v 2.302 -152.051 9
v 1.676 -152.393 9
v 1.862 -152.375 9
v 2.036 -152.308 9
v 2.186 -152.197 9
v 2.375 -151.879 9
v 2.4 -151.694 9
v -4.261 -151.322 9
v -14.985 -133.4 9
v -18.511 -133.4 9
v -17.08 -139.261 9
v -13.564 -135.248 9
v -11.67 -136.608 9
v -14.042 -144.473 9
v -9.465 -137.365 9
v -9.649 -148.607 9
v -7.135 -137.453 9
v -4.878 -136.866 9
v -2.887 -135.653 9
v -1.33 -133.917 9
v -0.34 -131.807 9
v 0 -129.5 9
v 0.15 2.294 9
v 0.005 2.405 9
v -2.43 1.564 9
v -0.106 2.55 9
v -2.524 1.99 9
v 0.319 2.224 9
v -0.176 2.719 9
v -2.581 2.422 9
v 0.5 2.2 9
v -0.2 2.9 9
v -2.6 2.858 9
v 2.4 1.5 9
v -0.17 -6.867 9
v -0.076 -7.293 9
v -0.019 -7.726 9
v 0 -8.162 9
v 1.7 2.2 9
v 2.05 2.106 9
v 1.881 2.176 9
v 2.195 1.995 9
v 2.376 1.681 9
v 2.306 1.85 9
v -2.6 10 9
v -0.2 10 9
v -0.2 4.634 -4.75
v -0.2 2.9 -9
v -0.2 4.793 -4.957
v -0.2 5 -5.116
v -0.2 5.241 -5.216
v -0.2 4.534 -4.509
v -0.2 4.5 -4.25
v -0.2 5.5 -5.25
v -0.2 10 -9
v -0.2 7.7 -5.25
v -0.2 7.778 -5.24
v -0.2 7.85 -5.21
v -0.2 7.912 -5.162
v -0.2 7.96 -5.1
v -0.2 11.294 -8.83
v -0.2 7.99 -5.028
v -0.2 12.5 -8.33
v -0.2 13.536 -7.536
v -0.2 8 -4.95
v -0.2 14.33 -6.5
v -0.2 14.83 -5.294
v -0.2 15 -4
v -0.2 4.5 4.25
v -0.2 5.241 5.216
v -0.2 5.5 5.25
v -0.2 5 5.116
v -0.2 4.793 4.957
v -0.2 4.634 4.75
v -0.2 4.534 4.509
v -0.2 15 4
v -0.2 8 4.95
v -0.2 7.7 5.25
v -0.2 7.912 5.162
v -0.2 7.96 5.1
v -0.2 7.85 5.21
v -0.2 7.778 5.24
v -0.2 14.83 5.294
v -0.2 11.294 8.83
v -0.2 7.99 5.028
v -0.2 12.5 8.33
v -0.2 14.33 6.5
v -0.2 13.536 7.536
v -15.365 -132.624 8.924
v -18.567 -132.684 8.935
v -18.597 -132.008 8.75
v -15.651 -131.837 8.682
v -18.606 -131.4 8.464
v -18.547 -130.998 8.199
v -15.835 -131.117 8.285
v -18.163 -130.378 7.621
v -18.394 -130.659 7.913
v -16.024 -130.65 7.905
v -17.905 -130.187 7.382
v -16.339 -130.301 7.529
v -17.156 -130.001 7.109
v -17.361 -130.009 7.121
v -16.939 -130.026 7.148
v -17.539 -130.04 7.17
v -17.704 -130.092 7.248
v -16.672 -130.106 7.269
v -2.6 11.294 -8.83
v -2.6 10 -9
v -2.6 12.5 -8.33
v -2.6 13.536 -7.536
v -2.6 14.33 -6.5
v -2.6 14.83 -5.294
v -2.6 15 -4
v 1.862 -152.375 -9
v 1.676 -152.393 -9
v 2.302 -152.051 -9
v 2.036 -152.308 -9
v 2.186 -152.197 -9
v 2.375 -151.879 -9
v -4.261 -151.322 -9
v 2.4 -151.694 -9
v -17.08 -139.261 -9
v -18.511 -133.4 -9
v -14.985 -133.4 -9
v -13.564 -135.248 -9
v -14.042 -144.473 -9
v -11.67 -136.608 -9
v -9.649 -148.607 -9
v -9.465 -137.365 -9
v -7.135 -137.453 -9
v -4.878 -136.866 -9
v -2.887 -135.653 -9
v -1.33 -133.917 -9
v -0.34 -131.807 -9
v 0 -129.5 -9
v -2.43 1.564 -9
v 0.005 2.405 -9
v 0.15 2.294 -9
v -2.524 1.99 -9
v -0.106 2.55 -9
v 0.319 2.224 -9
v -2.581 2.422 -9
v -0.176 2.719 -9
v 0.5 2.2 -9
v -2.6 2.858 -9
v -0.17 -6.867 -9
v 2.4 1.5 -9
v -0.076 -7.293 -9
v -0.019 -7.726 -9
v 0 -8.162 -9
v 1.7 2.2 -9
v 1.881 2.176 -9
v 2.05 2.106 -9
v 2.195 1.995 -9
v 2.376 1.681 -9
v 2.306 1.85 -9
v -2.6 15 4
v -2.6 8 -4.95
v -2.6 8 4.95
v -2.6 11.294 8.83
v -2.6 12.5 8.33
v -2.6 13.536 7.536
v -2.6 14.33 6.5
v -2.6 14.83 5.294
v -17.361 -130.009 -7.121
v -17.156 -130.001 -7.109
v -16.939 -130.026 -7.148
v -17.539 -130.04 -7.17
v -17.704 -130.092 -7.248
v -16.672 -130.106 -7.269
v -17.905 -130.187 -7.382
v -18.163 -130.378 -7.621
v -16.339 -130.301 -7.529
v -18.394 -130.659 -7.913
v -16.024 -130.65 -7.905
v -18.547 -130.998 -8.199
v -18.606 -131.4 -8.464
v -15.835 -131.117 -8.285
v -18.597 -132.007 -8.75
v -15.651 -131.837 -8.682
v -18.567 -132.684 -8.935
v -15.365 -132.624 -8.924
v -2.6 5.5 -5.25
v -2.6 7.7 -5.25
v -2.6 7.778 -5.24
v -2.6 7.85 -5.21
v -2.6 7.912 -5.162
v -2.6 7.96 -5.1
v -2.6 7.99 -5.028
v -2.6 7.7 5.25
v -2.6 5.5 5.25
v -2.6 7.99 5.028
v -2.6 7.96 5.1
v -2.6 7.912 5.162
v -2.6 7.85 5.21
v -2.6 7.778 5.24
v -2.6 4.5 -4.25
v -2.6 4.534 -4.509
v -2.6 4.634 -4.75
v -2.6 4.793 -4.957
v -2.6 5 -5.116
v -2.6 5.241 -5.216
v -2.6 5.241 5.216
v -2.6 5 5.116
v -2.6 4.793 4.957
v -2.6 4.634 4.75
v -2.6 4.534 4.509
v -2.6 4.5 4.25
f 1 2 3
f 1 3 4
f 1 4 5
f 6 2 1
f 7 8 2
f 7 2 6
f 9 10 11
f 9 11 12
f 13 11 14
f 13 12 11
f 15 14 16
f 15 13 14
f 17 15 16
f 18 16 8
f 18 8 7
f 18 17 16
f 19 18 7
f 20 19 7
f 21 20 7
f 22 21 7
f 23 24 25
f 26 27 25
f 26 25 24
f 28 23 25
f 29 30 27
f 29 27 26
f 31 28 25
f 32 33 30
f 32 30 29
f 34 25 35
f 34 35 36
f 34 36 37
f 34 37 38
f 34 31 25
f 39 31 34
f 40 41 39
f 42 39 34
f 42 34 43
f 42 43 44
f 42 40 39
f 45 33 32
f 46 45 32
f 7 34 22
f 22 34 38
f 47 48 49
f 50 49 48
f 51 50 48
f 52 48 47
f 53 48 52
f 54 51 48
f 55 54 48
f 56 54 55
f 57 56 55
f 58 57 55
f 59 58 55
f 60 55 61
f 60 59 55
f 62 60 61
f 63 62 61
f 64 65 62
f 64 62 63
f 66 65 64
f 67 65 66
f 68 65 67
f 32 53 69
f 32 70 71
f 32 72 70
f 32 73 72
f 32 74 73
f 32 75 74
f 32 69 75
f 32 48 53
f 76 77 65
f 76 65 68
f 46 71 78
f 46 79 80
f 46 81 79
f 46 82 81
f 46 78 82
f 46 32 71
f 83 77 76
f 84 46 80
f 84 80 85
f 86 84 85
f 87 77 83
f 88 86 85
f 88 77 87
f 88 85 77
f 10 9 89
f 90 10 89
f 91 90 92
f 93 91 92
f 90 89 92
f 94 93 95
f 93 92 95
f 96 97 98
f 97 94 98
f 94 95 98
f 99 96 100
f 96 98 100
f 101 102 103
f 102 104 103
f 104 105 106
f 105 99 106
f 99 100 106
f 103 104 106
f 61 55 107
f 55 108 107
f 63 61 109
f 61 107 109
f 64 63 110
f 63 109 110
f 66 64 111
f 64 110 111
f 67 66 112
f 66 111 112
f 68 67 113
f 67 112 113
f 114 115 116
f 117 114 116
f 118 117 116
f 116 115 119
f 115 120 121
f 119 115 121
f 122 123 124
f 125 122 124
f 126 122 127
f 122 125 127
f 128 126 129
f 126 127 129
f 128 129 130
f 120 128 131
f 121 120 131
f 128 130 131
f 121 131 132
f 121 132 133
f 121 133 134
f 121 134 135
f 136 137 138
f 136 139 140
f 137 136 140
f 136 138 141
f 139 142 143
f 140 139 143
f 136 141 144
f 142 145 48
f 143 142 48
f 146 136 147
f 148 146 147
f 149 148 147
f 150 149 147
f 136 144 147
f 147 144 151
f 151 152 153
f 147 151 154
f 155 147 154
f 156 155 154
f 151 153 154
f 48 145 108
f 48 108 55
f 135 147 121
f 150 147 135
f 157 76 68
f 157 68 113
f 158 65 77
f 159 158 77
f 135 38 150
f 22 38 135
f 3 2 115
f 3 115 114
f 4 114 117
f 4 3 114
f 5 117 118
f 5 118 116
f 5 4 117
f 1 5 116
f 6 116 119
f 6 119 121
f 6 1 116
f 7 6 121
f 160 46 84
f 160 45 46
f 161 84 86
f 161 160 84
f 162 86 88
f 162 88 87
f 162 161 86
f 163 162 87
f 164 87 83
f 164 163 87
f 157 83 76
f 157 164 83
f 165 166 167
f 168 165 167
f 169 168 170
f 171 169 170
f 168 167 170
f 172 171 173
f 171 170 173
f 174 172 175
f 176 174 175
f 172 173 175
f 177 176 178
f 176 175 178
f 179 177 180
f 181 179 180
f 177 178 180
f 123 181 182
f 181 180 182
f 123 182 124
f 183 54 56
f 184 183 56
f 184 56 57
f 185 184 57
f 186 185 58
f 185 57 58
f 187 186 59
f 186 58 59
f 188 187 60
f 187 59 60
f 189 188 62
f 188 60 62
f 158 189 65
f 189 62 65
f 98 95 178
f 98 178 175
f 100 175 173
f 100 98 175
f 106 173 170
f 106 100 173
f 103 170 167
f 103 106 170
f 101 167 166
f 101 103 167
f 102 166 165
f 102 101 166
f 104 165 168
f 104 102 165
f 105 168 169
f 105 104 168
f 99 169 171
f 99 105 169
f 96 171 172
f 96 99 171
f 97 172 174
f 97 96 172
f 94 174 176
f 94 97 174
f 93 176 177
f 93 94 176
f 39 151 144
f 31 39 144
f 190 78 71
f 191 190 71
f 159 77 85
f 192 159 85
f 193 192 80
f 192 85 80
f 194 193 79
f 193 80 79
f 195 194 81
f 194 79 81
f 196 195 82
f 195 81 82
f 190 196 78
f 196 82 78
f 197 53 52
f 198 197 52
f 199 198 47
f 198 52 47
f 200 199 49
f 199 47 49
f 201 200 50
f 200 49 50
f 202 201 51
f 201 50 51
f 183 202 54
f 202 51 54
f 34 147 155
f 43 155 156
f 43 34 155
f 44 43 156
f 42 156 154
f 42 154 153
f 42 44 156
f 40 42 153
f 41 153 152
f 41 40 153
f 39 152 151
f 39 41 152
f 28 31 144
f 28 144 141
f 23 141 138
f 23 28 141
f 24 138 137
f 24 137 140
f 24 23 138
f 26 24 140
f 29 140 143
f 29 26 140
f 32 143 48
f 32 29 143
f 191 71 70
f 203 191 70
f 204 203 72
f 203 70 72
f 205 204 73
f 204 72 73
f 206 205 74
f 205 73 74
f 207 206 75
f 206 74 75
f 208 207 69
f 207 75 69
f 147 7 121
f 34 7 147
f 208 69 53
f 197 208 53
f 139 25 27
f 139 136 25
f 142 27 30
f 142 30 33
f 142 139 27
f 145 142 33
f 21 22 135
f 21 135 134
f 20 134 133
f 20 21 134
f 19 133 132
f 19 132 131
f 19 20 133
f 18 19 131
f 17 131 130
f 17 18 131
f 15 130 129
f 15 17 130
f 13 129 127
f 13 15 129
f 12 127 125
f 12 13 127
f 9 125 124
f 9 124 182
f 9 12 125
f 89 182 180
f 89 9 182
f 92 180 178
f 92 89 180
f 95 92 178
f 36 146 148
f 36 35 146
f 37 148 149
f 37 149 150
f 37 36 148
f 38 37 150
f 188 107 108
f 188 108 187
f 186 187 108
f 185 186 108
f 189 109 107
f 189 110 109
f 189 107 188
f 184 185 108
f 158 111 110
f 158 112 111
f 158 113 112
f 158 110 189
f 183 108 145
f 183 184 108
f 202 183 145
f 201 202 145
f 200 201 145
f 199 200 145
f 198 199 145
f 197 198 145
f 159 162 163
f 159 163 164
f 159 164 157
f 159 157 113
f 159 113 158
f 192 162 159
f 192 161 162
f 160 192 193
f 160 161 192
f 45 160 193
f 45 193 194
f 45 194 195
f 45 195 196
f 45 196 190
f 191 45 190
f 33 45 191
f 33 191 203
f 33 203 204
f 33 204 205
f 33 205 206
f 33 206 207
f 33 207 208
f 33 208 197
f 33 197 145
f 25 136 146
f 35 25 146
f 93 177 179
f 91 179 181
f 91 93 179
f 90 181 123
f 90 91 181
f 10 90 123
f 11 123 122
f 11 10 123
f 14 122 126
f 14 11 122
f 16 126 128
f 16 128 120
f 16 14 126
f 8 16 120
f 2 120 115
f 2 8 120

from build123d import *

# Parameters (mm, degrees)
F1_DEPTH = 9
F2_R     = 5
F4_START = -10
F4_DEPTH = 20
F6_DEPTH = 10
F7_R     = 5


with BuildPart() as f1:
    # F0 (on Top) → F1 (new body, symmetric)
    with BuildSketch(Plane.XY):
        with BuildLine():
            Line((-2.6, 2.2), (0, -7.5033320997))
            Line((0, -7.5033320997), (0, -129.5))
            ThreePointArc((0, -129.5), (-7.1872847082, -137.4586113019), (-15.8348734636, -131.1170212766))
            ThreePointArc((-15.8348734636, -131.1170212766), (-17.3482014958, -130.0072430222), (-18.6059763198, -131.4))
            ThreePointArc((-18.6059763198, -131.4), (-12.7073180305, -145.995204112), (1.6758691731, -152.3934912697))
            ThreePointArc((1.6758691731, -152.3934912697), (2.1863683898, -152.1973413167), (2.4, -151.6939073197))
            Line((2.4, -151.6939073197), (2.4, 1.5))
            ThreePointArc((2.4, 1.5), (2.1949747468, 1.9949747468), (1.7, 2.2))
            Line((1.7, 2.2), (0.5, 2.2))
            ThreePointArc((0.5, 2.2), (0.0050252532, 2.4050252532), (-0.2, 2.9))
            Line((-0.2, 2.9), (-0.2, 15))
            Line((-0.2, 15), (-2.6, 15))
            Line((-2.6, 15), (-2.6, 2.2))
        make_face()
    extrude(amount=F1_DEPTH, both=True)

    # F2
    f2_edges = [f1.edges().sort_by_distance(p)[0] for p in [
        (-2.6, 2.2, 0),
        (0, -7.503332, 0),
    ]]
    fillet(f2_edges, radius=F2_R)

    # F3 (on Right) → F4 (cut)
    with BuildSketch(Plane.YZ.offset(F4_START)):
        with BuildLine():
            ThreePointArc((-129.4, -5), (-130.5715728753, -7.8284271247), (-133.4, -9))
            Line((-133.4, -9), (-133.4, -10))
            Line((-133.4, -10), (-128.4, -10))
            Line((-128.4, -10), (-128.4, 10))
            Line((-128.4, 10), (-133.4, 10))
            Line((-133.4, 10), (-133.4, 9))
            ThreePointArc((-133.4, 9), (-130.5715728753, 7.8284271247), (-129.4, 5))
            Line((-129.4, 5), (-129.4, -5))
        make_face()
    extrude(amount=-F4_DEPTH, mode=Mode.SUBTRACT)

    # F5 (on Right) → F6 (cut)
    with BuildSketch(Plane.YZ):
        with BuildLine():
            ThreePointArc((7.7, -5.25), (7.9121320344, -5.1621320344), (8, -4.95))
            Line((8, -4.95), (8, 4.95))
            ThreePointArc((8, 4.95), (7.9121320344, 5.1621320344), (7.7, 5.25))
            Line((7.7, 5.25), (5.5, 5.25))
            ThreePointArc((5.5, 5.25), (4.7928932188, 4.9571067812), (4.5, 4.25))
            Line((4.5, 4.25), (4.5, -4.25))
            ThreePointArc((4.5, -4.25), (4.7928932188, -4.9571067812), (5.5, -5.25))
            Line((5.5, -5.25), (7.7, -5.25))
        make_face()
    extrude(amount=-F6_DEPTH, mode=Mode.SUBTRACT)

    # F7
    f7_edges = [f1.edges().sort_by_distance(p)[0] for p in [
        (-1.4, 15, -9),
        (-1.4, 15, 9),
    ]]
    fillet(f7_edges, radius=F7_R)


solid = f1.part
